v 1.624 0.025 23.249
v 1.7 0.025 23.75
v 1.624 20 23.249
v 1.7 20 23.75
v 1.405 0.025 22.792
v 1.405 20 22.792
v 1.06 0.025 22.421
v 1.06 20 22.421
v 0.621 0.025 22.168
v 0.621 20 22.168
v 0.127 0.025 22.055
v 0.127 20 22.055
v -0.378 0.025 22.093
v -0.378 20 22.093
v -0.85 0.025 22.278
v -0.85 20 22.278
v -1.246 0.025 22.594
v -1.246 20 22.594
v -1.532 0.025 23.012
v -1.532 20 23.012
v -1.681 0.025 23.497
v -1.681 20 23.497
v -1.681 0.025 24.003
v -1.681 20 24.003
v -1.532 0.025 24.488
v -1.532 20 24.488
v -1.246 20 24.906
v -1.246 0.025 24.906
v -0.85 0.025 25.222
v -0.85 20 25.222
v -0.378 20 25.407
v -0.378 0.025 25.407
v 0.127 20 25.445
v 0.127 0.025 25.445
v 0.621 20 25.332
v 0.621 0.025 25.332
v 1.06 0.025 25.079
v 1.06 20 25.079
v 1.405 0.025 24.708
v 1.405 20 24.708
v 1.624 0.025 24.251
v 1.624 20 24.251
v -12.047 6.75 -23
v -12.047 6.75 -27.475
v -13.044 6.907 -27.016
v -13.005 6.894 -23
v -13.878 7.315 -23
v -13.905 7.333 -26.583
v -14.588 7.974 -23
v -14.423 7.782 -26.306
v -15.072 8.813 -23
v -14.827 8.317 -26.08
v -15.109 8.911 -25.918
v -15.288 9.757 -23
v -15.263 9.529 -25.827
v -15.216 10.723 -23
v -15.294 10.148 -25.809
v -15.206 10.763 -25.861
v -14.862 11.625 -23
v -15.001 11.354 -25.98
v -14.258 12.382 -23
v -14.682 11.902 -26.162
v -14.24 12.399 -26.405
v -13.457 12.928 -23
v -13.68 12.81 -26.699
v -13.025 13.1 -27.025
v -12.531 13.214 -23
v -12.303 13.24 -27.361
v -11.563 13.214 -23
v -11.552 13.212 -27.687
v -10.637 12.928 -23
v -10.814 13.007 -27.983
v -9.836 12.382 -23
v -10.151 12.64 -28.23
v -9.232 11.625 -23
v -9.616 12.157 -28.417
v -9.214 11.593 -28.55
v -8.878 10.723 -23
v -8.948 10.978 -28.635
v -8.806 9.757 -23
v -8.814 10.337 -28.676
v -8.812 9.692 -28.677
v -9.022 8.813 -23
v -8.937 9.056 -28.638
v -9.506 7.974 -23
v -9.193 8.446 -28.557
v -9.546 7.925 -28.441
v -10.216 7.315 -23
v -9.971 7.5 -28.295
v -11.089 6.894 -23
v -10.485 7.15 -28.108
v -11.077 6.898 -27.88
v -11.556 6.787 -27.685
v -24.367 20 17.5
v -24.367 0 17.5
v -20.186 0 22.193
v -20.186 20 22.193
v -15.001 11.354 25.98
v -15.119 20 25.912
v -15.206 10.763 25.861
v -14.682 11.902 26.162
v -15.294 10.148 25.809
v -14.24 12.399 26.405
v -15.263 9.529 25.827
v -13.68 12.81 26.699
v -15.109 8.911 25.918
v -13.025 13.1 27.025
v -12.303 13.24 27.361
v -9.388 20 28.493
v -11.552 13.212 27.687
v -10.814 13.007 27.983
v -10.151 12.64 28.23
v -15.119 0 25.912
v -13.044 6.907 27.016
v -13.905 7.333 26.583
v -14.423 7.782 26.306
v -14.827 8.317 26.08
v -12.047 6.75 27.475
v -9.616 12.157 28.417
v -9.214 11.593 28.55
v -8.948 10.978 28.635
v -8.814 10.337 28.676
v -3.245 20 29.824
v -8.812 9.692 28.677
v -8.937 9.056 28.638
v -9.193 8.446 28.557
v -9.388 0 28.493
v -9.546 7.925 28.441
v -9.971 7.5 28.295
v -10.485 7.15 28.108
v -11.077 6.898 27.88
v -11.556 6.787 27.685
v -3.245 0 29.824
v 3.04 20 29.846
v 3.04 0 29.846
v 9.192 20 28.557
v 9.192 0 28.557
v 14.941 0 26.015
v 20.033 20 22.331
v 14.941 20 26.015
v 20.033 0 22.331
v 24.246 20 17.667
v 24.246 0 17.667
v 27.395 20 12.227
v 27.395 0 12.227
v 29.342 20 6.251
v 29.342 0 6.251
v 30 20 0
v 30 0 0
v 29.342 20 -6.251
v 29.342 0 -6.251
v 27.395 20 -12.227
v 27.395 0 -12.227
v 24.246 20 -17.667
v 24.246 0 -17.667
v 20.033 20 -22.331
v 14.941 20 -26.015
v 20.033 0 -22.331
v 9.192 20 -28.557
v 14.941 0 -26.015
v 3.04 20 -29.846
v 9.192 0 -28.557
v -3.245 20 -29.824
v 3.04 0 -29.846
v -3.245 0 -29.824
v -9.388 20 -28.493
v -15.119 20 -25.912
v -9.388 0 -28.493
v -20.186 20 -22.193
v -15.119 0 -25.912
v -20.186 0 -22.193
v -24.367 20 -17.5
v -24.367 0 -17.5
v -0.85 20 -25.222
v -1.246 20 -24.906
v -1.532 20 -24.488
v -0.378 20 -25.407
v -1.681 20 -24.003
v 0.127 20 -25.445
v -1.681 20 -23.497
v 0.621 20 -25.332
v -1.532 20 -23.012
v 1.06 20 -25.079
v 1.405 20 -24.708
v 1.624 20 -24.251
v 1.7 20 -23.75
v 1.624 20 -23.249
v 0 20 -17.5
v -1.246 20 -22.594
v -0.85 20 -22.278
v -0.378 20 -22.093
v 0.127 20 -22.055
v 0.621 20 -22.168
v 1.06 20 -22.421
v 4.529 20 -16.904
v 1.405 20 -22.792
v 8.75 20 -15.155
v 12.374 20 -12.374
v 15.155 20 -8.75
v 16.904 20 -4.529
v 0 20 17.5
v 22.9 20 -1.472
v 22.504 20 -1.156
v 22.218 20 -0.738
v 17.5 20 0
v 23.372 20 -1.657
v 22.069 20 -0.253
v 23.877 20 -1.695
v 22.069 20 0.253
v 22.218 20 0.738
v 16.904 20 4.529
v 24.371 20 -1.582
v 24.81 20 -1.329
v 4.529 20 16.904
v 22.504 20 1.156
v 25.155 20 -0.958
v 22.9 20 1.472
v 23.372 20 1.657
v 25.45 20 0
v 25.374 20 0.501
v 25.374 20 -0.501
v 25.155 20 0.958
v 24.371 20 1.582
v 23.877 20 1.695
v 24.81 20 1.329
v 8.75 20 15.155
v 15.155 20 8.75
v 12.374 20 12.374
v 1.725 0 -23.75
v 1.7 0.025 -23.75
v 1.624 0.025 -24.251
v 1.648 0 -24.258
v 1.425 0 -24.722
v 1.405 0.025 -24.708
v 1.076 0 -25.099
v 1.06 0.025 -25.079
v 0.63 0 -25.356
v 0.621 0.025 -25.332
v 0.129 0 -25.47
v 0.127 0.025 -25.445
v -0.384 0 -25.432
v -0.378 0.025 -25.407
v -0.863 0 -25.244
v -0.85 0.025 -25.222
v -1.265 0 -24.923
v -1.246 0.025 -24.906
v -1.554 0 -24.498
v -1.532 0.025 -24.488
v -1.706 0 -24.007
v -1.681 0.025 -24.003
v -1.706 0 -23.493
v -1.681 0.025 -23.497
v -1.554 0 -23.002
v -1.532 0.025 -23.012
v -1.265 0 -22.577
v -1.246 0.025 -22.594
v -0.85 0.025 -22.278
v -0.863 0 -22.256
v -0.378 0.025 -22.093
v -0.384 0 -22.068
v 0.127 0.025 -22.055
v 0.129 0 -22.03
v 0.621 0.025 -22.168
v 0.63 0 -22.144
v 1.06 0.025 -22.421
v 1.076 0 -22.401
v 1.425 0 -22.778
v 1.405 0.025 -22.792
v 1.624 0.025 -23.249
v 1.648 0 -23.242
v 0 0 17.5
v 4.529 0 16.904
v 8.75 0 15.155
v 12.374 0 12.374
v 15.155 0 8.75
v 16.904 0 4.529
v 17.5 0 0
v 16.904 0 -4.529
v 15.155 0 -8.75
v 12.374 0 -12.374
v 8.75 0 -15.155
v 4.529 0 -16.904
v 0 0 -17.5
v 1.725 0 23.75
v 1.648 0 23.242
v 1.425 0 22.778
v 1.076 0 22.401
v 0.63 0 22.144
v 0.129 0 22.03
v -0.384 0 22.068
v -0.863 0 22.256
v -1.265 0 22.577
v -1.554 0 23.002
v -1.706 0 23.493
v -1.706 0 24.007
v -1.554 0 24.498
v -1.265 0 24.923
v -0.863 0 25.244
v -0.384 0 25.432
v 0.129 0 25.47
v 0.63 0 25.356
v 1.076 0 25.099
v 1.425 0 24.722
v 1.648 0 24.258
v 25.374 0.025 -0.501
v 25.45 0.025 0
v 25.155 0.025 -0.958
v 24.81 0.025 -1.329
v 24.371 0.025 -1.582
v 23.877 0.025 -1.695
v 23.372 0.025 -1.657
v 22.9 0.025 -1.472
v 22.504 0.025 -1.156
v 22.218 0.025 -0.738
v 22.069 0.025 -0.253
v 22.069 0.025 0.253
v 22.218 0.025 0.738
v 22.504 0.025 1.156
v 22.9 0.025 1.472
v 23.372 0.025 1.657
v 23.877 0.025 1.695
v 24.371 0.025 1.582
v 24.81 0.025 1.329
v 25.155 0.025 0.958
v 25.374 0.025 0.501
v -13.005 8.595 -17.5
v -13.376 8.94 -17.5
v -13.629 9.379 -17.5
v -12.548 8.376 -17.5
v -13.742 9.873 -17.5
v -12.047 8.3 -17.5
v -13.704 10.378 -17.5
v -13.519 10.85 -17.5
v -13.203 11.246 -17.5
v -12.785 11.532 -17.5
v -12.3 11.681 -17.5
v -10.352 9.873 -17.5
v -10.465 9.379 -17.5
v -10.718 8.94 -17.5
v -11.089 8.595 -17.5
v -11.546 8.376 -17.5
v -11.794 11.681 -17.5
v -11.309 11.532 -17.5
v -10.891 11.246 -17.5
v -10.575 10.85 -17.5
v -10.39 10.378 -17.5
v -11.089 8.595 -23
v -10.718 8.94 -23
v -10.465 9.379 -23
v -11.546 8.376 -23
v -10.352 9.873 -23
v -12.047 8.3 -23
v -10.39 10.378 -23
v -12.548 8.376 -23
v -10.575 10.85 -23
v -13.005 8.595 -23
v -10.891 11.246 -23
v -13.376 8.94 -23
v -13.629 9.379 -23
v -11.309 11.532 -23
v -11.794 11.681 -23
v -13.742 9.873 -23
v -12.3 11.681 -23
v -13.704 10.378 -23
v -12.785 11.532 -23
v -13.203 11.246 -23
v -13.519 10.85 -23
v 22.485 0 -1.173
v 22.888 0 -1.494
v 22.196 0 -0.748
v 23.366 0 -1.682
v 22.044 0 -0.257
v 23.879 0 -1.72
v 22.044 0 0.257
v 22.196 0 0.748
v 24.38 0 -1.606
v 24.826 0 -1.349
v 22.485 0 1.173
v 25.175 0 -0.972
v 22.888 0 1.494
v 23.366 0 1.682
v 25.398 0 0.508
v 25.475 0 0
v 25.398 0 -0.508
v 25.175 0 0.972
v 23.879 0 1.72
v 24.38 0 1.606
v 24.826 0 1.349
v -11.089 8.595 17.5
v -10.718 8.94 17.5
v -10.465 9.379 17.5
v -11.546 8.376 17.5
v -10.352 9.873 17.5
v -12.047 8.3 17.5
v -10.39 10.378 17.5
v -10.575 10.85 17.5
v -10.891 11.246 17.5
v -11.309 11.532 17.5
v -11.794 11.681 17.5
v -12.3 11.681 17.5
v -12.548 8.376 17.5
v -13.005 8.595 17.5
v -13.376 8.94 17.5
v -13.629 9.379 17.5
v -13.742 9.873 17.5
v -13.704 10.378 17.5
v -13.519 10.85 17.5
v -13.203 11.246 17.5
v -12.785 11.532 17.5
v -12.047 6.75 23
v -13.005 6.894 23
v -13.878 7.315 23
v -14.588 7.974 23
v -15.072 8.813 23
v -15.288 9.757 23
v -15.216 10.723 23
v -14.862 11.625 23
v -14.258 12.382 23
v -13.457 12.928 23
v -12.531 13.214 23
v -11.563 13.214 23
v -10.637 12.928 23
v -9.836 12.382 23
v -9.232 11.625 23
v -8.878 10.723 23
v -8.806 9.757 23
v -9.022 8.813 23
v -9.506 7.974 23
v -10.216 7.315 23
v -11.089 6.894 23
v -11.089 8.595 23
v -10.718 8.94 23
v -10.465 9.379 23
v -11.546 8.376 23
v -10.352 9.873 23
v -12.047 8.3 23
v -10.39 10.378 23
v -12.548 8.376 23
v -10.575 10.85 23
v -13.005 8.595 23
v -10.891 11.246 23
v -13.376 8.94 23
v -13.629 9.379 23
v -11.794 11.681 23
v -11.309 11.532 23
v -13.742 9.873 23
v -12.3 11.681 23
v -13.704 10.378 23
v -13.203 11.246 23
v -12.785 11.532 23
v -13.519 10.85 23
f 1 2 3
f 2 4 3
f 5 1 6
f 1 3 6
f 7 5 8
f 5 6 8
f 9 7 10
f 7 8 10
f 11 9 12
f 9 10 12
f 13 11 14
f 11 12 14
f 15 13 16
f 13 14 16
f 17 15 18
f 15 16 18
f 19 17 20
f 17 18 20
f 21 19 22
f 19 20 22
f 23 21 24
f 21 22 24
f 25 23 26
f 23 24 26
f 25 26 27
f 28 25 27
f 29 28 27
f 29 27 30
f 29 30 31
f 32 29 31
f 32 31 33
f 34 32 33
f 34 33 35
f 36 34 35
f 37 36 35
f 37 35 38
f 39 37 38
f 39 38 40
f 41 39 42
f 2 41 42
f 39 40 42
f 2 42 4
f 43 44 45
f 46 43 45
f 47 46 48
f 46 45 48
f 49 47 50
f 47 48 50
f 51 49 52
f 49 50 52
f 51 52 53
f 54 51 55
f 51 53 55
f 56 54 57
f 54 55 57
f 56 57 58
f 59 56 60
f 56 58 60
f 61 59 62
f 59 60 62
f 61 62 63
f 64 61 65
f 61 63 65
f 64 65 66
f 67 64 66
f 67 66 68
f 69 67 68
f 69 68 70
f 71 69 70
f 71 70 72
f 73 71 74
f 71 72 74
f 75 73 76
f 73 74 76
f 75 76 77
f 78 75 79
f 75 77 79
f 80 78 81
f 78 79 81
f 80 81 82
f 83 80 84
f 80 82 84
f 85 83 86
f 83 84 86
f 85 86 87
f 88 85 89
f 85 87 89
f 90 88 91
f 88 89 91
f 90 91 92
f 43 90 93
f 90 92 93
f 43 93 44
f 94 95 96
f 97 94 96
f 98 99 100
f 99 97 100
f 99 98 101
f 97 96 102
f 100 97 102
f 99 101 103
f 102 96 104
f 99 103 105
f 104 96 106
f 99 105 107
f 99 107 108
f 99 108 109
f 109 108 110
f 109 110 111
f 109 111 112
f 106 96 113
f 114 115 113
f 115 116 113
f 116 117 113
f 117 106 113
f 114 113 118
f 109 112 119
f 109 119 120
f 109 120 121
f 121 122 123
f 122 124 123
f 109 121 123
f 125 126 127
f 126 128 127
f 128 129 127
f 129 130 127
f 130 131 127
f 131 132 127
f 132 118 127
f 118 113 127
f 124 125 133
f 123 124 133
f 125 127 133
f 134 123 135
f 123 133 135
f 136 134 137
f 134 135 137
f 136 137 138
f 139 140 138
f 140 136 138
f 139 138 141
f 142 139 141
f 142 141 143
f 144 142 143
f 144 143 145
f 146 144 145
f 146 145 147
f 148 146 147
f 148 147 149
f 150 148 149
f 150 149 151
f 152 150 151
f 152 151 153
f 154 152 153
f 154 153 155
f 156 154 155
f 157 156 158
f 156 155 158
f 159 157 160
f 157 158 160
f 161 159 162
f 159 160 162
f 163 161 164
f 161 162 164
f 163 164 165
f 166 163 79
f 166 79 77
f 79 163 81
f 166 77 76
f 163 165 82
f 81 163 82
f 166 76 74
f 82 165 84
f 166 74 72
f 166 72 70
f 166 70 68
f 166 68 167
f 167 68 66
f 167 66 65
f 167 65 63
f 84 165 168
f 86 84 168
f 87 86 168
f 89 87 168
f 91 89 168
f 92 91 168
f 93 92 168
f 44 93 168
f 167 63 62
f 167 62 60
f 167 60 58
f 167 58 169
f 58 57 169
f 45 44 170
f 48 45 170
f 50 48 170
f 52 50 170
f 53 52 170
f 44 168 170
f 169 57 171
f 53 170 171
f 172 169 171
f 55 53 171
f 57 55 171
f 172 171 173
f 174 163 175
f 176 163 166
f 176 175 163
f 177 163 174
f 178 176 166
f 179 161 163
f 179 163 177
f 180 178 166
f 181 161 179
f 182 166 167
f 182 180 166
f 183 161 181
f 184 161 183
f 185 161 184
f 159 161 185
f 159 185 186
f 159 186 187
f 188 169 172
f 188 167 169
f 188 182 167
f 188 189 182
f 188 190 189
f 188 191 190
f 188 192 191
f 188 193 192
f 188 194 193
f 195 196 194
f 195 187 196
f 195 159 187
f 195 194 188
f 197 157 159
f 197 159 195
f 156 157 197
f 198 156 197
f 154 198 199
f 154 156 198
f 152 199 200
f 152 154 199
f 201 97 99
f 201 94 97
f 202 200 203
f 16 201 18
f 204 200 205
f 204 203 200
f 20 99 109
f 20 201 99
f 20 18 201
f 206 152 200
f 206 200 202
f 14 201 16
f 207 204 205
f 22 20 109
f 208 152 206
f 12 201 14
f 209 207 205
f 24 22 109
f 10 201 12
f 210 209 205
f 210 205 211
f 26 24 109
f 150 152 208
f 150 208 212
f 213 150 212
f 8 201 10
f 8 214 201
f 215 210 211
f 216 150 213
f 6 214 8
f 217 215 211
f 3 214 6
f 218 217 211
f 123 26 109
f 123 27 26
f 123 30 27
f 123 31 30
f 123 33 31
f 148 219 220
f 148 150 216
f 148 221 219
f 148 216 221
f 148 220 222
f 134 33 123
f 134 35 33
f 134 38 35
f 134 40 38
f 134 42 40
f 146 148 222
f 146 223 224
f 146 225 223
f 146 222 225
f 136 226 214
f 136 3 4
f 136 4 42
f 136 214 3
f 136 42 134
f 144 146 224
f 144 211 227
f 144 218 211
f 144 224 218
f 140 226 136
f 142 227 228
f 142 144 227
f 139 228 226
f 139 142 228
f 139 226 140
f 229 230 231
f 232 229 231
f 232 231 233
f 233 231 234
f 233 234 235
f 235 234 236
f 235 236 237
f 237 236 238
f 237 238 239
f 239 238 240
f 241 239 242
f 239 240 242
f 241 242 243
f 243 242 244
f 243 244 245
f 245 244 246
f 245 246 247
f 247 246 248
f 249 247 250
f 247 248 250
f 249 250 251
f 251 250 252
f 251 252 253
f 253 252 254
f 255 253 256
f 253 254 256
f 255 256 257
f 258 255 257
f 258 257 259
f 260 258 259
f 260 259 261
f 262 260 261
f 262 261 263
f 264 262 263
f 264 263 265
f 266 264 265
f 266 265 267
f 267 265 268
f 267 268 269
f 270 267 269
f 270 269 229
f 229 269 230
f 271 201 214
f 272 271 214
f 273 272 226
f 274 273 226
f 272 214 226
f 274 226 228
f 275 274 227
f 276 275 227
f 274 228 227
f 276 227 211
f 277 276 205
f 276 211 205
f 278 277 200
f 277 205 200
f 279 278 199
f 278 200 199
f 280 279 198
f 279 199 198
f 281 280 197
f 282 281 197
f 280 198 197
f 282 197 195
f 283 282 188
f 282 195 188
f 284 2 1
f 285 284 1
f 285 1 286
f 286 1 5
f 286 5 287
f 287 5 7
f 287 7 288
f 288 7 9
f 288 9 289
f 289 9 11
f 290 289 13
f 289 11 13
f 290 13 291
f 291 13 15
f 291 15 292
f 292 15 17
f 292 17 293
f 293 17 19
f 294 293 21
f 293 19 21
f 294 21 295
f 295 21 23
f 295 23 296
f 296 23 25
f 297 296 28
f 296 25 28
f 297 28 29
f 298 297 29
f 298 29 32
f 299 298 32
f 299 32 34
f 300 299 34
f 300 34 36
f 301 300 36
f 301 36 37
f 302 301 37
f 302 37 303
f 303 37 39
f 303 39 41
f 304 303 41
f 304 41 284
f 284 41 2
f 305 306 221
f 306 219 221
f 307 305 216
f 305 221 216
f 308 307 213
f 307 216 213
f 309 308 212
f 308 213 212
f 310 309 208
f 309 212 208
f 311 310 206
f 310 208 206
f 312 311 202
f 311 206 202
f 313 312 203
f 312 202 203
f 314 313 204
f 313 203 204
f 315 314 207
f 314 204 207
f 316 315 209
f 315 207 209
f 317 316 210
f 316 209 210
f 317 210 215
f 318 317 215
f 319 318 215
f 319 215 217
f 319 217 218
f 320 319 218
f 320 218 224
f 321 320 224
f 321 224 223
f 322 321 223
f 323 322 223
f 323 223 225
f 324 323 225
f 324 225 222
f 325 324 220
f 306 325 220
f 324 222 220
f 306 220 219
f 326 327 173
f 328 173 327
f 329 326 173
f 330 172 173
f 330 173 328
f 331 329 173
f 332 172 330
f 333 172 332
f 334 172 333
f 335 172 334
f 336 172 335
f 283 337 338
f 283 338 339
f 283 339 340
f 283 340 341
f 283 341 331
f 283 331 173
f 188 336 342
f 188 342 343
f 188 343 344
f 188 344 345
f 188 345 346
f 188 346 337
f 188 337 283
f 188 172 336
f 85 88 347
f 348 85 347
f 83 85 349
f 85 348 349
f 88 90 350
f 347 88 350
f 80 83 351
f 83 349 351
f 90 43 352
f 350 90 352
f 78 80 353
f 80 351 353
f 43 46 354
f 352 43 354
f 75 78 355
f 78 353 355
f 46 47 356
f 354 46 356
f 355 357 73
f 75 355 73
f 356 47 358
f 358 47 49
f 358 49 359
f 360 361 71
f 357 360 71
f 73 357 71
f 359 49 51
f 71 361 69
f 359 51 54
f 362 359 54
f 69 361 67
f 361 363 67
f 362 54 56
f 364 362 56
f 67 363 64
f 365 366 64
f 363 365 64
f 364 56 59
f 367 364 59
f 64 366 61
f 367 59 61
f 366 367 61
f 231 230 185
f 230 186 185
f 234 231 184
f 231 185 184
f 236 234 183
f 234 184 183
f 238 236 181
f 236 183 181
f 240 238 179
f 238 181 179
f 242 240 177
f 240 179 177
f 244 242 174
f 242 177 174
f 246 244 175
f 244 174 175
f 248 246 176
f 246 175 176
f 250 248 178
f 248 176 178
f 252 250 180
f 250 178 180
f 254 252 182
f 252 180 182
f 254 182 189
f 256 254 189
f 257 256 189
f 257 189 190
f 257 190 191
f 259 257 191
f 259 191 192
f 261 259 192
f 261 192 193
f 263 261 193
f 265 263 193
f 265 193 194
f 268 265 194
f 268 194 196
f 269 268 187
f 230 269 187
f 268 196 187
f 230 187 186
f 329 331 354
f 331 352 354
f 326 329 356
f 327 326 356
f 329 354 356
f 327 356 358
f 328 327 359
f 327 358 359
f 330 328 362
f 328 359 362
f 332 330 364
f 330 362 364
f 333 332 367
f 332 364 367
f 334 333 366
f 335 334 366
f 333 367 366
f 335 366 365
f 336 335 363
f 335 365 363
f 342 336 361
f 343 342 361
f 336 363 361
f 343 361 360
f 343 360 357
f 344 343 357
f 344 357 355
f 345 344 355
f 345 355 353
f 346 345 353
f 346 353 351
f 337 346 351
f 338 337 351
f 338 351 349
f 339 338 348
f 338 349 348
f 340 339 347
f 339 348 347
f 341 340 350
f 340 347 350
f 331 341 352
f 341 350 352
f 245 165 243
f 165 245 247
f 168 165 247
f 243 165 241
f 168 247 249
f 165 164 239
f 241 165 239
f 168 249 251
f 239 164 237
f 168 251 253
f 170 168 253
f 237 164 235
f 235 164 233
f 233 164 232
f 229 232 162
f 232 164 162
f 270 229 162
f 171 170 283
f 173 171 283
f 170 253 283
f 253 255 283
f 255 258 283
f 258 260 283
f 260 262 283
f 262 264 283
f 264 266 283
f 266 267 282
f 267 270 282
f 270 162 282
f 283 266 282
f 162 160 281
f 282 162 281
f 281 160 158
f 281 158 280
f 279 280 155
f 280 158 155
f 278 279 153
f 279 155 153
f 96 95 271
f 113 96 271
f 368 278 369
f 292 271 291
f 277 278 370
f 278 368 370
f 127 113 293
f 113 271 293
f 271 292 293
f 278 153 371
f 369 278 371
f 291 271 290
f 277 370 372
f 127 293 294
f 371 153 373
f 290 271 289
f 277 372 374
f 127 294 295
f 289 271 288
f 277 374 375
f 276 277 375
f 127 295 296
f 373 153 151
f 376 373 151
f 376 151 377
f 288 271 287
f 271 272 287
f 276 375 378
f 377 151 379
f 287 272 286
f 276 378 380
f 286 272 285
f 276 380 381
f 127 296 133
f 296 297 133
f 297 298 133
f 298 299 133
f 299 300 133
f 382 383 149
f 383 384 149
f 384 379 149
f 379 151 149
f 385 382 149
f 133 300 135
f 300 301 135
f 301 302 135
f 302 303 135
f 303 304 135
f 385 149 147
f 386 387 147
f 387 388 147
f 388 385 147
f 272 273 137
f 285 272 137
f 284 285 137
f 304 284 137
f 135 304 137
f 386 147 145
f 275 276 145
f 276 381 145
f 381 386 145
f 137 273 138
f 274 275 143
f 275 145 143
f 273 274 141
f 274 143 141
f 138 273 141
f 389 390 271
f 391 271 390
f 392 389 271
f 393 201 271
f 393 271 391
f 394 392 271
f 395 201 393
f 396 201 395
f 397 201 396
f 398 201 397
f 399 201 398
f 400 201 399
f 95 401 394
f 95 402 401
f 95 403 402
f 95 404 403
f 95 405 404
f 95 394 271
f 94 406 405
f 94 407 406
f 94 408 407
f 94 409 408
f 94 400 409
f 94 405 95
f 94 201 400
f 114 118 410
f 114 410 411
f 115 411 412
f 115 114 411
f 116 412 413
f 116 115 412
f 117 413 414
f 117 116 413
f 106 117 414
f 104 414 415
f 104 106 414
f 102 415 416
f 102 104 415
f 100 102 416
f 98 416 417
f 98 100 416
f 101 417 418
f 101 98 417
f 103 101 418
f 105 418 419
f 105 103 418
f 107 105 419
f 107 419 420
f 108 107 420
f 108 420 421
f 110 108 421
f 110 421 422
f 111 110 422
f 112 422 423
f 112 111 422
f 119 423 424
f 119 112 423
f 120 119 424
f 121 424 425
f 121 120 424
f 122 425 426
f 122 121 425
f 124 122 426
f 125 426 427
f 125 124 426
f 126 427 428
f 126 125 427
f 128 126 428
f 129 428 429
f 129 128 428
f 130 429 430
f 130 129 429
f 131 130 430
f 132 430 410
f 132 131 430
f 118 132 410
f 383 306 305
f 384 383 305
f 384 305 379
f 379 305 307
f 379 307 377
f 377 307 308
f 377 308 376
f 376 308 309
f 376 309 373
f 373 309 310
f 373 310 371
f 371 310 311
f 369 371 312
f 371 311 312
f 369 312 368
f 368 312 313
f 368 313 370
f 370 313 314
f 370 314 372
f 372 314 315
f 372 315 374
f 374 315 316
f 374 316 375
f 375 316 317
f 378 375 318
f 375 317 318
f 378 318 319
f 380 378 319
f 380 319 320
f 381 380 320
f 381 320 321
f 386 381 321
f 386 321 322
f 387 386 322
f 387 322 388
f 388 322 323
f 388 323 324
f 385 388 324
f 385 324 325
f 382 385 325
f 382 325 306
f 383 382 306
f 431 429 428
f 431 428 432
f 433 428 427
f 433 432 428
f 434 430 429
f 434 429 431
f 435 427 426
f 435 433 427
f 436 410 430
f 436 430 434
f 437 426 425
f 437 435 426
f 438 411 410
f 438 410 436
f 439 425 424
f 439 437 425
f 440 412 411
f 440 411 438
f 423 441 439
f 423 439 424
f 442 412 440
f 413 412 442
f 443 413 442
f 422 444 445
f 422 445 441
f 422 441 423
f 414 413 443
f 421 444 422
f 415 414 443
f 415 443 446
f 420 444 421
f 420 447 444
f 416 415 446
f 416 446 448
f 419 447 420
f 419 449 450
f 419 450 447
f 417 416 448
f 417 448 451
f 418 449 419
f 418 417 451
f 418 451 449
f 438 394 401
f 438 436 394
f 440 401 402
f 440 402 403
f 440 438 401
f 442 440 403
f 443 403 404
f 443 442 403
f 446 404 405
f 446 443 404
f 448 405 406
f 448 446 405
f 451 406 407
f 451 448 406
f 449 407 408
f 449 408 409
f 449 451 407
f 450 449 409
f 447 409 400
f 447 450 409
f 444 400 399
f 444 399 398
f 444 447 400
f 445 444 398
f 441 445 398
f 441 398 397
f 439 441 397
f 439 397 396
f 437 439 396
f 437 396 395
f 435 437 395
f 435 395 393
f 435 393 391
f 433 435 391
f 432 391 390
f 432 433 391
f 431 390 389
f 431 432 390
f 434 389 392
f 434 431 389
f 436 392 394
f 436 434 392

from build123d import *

# Parameters (mm, degrees)
SKETCH2_R                      = 30
BOSS_EXTRUDE1_DEPTH            = 20
CUT_EXTRUDE2_DEPTH             = 47.904157598
M3_CLEARANCE_HOLE1_D           = 3.4
M3_CLEARANCE_HOLE1_CSINK_D     = 3.45
M3_CLEARANCE_HOLE1_CSINK_ANGLE = 90
CUT_EXTRUDE3_DEPTH             = 47.904157598


with BuildPart() as part:
    # Sketch2 → Boss-Extrude1 (new body)
    with BuildSketch(Plane(origin=(0, 0, 0), x_dir=(1, 0, 0), z_dir=(0, 1, 0))):
        with Locations(Location((0, 0, 0), (0, 0, 270))):
            Circle(SKETCH2_R)
    extrude(amount=BOSS_EXTRUDE1_DEPTH)

    # Sketch3 → Cut-Extrude2 (cut, through all)
    with BuildSketch(Plane(origin=(0, 20, 0), x_dir=(1, 0, 0), z_dir=(0, 1, 0))):
        with BuildLine():
            ThreePointArc((0, -17.5), (17.5, 0), (0, 17.5))
            Line((0, 17.5), (-2, 17.5))
            Line((-2, 17.5), (-2, 9.06190379))
            Line((-2, 9.06190379), (-2, 6.812488532))
            ThreePointArc((-2, 6.812488532), (-7.1, 0), (-2, -6.812488532))
            Line((-2, -6.812488532), (-2, -9.06190379))
            Line((-2, -9.06190379), (-2, -17.5))
            Line((-2, -17.5), (0, -17.5))
        make_face()
    extrude(amount=-CUT_EXTRUDE2_DEPTH, mode=Mode.SUBTRACT)

    # M3 Clearance Hole1 (through all)
    with Locations(Plane(origin=(0, 0, 0), x_dir=(-1, 0, 0), z_dir=(0, -1, 0))):
        with Locations((0, 23.75), (-23.75, 0), (0, -23.75)):
            CounterSinkHole(M3_CLEARANCE_HOLE1_D / 2, M3_CLEARANCE_HOLE1_CSINK_D / 2, counter_sink_angle=M3_CLEARANCE_HOLE1_CSINK_ANGLE)

    # Sketch6 → Cut-Extrude3 (cut, through all)
    with BuildSketch(Plane(origin=(0, 20, 0), x_dir=(1, 0, 0), z_dir=(0, 1, 0))):
        with BuildLine():
            Line((-24.366985862, 17.5), (-2, 17.5))
            Line((-2, 17.5), (-2, -17.5))
            Line((-2, -17.5), (-24.366985862, -17.5))
            ThreePointArc((-24.366985862, -17.5), (-30, 0), (-24.366985862, 17.5))
        make_face()
    extrude(amount=-CUT_EXTRUDE3_DEPTH, mode=Mode.SUBTRACT)

    # Sketch8 → CBORE for M3 SHCS1 (revolve, cut)
    with BuildSketch(Plane(origin=(-12.046985862, 10, 30), x_dir=(0, -1, 0), z_dir=(1, 0, 0))):
        Polygon((0, 0), (0, 12.5), (1.7, 12.5), (1.7, 7), (3.25, 7), (3.25, 0.025), (3.275, 0), align=None)
    cbore_for_m3_shcs1 = revolve(axis=Axis((-12.046985862, 10, 36.35), (0, 0, -1)), mode=Mode.SUBTRACT)

    # Mirror1: CBORE for M3 SHCS1 across plane
    add(cbore_for_m3_shcs1.mirror(Plane.XY), mode=Mode.SUBTRACT)


solid = part.part
